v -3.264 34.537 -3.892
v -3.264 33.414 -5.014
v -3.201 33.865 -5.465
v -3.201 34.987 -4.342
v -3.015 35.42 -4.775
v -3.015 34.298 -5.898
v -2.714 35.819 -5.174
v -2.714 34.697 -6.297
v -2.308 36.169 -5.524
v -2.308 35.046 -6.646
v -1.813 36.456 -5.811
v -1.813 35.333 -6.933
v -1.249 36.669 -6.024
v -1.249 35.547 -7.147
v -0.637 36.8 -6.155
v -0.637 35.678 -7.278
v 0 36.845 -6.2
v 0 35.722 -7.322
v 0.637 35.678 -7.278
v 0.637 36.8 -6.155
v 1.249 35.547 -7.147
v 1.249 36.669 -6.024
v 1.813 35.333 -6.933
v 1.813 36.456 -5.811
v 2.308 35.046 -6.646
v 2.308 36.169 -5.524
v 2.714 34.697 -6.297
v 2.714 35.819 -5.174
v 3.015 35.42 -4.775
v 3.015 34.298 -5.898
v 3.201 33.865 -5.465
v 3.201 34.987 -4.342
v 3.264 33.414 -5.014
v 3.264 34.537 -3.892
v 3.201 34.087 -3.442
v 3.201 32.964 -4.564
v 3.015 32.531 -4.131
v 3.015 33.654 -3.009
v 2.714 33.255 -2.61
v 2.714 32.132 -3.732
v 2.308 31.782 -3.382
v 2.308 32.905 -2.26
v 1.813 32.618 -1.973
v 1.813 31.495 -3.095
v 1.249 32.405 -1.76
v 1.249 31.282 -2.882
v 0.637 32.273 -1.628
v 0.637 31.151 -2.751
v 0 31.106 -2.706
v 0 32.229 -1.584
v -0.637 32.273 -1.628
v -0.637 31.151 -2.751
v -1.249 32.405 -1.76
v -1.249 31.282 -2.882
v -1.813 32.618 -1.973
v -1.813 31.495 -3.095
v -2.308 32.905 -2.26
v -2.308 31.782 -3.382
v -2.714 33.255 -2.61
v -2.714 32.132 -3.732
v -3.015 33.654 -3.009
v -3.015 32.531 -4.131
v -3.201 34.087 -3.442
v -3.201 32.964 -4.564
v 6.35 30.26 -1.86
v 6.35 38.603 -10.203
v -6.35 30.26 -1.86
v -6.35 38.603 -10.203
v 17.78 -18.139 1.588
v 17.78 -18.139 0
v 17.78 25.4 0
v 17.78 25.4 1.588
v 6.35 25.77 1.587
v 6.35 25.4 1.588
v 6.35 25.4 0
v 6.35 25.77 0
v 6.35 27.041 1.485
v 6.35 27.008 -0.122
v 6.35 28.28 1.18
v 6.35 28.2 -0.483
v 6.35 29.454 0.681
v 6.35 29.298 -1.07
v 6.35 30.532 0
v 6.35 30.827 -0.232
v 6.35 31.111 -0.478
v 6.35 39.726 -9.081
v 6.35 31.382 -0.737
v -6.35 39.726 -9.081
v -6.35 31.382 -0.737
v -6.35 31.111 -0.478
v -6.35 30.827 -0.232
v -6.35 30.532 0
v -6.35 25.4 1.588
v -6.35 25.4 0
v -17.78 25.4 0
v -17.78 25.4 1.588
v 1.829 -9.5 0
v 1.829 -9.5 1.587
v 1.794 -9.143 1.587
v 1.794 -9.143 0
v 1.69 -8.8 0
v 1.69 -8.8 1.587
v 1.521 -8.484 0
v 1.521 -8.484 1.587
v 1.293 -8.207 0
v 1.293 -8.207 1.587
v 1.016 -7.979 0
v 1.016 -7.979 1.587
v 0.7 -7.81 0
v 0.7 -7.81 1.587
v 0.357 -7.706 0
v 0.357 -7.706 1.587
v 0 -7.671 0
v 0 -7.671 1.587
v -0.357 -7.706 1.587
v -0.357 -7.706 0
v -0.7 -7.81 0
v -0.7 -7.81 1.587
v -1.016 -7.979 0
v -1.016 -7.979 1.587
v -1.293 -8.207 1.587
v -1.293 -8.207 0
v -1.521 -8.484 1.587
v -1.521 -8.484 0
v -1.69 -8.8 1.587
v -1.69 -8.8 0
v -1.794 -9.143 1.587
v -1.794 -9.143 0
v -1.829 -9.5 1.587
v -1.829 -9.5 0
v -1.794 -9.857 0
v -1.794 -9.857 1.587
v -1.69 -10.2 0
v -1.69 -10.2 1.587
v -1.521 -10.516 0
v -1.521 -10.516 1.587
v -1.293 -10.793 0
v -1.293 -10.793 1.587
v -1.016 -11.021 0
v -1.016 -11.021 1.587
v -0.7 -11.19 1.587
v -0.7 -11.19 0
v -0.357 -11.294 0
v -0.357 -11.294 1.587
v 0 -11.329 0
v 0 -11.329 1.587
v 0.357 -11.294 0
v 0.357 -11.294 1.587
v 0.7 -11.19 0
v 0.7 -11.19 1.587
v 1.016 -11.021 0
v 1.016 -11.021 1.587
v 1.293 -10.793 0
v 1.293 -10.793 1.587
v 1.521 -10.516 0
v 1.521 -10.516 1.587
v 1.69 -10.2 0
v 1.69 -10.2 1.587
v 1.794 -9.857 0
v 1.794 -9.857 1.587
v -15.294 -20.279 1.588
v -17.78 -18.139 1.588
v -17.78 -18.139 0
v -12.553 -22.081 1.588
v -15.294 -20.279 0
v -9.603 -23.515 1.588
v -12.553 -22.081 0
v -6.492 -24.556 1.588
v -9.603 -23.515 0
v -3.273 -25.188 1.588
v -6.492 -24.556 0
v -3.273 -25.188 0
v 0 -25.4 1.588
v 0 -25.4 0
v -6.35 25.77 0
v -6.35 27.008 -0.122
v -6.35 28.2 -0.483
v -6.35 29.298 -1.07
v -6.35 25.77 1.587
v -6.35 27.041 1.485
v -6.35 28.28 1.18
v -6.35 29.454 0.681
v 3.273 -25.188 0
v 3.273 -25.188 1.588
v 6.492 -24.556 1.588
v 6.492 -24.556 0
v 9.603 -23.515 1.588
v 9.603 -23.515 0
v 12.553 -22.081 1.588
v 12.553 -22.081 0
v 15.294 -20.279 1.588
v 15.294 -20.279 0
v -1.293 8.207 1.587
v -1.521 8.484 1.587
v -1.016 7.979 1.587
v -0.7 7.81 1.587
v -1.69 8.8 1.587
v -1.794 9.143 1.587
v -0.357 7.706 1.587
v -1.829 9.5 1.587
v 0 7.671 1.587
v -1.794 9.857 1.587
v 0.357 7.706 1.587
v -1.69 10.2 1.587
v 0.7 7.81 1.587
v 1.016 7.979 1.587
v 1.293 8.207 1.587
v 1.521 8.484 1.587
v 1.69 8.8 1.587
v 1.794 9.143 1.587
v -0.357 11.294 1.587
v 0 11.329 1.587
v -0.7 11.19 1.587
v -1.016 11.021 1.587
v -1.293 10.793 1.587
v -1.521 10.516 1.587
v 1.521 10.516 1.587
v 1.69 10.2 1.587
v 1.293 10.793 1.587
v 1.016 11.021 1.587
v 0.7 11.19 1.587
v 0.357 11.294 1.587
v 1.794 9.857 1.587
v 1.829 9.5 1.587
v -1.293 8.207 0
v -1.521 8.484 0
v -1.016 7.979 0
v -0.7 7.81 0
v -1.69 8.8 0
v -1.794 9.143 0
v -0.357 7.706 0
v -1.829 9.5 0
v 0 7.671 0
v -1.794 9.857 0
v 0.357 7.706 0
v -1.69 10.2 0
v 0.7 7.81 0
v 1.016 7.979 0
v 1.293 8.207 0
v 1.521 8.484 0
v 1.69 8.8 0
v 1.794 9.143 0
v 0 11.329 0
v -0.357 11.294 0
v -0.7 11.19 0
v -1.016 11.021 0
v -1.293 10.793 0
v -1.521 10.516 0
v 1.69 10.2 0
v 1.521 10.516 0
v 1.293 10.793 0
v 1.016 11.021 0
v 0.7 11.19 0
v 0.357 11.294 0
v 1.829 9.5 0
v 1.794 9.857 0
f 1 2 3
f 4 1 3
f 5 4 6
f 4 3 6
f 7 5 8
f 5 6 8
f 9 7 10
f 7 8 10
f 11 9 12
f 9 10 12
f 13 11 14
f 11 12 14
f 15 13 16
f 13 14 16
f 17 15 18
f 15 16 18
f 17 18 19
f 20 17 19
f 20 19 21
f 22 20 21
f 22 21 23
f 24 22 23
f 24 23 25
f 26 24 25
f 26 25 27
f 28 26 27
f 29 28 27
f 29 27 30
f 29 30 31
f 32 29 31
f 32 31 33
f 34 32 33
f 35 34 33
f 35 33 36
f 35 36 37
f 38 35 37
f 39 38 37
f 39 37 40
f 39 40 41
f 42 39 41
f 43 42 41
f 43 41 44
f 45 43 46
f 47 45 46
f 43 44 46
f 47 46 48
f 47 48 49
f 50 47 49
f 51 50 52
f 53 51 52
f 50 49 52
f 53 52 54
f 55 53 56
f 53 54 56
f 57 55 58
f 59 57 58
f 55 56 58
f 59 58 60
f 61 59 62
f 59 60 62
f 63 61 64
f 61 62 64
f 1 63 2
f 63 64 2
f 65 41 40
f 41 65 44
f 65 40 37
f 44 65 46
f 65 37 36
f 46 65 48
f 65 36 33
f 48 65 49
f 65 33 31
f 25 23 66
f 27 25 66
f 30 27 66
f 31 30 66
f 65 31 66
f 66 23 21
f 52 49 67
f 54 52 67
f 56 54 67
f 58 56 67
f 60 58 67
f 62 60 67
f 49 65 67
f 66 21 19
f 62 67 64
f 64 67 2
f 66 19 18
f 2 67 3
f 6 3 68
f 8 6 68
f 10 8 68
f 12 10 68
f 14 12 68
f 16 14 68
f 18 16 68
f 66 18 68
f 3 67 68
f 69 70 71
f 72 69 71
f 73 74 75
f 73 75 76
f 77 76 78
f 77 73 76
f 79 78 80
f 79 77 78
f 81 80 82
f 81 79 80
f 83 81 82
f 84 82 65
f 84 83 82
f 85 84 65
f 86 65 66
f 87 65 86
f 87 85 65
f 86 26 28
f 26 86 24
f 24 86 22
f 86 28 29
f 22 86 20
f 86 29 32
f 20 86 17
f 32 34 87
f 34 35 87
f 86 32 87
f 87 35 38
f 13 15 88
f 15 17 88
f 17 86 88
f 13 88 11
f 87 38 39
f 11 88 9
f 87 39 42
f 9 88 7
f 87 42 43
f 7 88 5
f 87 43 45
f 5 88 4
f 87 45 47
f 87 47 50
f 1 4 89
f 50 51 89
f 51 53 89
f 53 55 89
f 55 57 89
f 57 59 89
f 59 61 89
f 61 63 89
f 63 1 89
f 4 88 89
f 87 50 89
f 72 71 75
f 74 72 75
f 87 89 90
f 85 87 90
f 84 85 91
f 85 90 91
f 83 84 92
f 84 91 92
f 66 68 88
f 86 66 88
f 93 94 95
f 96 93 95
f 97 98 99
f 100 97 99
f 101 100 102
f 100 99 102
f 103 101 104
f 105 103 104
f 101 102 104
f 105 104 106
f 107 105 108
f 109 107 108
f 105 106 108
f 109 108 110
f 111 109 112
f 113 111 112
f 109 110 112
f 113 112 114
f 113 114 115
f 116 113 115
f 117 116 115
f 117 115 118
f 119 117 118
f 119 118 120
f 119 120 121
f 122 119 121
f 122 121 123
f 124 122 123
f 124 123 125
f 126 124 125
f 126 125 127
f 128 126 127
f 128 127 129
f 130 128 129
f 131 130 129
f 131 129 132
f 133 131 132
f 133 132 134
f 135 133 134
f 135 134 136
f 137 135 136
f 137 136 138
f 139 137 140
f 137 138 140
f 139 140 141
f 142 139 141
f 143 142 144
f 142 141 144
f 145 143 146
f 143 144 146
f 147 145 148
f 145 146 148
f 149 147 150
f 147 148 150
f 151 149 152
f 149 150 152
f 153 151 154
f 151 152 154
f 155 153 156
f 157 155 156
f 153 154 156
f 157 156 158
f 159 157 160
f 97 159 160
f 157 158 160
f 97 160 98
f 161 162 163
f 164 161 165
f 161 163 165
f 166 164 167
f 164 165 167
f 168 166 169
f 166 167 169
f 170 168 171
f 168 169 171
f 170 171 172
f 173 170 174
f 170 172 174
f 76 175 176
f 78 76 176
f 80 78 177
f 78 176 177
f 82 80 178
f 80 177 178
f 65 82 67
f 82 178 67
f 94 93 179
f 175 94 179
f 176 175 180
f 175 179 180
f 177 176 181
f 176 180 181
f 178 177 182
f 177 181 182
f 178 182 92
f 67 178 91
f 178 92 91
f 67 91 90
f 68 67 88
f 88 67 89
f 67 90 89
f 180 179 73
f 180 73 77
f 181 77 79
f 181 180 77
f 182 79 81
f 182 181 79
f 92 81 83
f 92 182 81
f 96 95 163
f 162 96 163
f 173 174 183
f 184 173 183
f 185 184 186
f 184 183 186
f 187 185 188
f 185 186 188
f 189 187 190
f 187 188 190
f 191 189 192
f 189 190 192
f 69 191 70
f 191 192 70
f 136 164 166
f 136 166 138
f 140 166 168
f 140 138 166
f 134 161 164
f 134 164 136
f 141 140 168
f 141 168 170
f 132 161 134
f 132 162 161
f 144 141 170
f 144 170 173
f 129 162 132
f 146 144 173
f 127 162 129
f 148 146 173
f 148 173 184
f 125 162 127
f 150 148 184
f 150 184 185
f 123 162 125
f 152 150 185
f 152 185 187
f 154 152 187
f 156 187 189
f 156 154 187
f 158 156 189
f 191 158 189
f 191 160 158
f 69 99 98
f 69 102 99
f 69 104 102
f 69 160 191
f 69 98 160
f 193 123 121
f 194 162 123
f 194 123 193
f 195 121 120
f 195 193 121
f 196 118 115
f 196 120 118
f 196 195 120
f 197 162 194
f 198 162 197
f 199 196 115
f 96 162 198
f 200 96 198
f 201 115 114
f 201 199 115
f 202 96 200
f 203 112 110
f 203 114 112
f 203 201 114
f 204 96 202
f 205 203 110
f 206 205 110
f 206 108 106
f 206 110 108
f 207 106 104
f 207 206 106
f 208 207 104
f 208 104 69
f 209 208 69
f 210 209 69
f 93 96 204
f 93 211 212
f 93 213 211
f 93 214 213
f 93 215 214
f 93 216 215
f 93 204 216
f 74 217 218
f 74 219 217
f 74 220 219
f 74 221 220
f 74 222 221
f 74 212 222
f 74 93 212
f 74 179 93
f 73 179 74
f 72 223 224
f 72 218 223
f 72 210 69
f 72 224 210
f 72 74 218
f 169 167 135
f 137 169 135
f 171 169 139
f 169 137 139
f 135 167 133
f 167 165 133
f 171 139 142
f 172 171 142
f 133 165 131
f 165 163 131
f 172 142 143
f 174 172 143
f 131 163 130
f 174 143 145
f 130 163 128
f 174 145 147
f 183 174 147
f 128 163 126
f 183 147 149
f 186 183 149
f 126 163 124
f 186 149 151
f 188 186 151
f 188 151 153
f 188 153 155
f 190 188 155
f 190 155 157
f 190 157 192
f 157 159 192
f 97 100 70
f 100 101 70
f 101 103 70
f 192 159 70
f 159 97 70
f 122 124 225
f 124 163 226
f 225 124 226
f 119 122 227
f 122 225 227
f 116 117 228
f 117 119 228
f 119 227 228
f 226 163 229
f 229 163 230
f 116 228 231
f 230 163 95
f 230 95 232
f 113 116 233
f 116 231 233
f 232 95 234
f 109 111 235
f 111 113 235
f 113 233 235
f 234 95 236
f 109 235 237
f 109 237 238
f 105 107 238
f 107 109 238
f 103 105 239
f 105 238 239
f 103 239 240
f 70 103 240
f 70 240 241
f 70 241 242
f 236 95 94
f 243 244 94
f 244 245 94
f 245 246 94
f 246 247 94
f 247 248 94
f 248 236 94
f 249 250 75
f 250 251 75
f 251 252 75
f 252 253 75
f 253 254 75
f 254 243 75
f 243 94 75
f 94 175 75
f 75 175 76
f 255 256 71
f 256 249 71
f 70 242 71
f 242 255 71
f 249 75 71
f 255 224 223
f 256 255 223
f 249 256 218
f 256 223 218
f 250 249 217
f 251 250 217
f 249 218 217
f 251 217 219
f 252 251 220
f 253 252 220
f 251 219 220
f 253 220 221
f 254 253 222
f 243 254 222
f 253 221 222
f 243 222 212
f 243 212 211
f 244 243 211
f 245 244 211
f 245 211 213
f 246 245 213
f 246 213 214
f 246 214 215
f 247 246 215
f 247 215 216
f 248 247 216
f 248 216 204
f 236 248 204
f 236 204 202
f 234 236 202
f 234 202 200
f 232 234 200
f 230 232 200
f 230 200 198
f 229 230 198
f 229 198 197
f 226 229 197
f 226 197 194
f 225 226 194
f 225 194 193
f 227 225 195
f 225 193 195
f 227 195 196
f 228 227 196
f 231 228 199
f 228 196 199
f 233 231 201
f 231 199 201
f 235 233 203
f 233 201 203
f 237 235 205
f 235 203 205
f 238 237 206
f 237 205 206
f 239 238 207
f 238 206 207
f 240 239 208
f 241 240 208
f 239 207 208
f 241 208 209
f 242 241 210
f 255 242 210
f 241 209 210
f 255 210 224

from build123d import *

# Parameters (mm, degrees)
BOSS_EXTRUDE1_DEPTH         = 1.5875
F_6_CLEARANCE_HOLE2_D       = 3.6576
F_6_CLEARANCE_HOLE2_DEPTH   = 38.354
F_6_CLEARANCE_HOLE2_TIP     = 1.0988539
SKETCHED_START              = -6.35
SKETCHED_BEND10_DEPTH       = 12.7
SKETCHED_BEND10_2_DEPTH     = 12.7
CUT_EXTRUDE1_DEPTH          = 45.703347893
F_1_4_CLEARANCE_HOLE1_D     = 6.5278
F_1_4_CLEARANCE_HOLE1_DEPTH = 38.354
F_1_4_CLEARANCE_HOLE1_TIP   = 1.961148974


# Read off the part's stored shape, not the designer's step: Sketched Bend10
with BuildPart() as part:
    # Sketch1 → Boss-Extrude1 (new body)
    with BuildSketch(Plane.XY):
        Polygon((-17.78, -25.4), (17.78, -25.4), (17.78, 25.4), (6.35, 25.4), (6.35, 43.18), (-6.35, 43.18), (-6.35, 25.4), (-17.78, 25.4), align=None)
    extrude(amount=BOSS_EXTRUDE1_DEPTH)

    # #6 Clearance Hole2
    with Locations(Plane(origin=(0, 0, 0), x_dir=(-1, 0, 0), z_dir=(0, 0, -1))):
        with Locations((0, 9.5), (0, -9.5)):
            Hole(F_6_CLEARANCE_HOLE2_D / 2, depth=F_6_CLEARANCE_HOLE2_DEPTH)
            with Locations((0, 0, -(F_6_CLEARANCE_HOLE2_DEPTH + F_6_CLEARANCE_HOLE2_TIP / 2))):  # 118° drill point
                Cone(0, F_6_CLEARANCE_HOLE2_D / 2, F_6_CLEARANCE_HOLE2_TIP, mode=Mode.SUBTRACT)

    # Sketched Bend10 outline → Sketched Bend10 (cut)
    with BuildSketch(Plane.YZ.offset(SKETCHED_START)):
        with BuildLine():
            ThreePointArc((25.769655935, 1.5875), (28.279713828, 1.180173678), (30.532155935, 0))
            Line((30.532155935, 0), (43.18, 0))
            Line((43.18, 0), (43.18, 1.5875))
            Line((43.18, 1.5875), (25.769655935, 1.5875))
        make_face()
    extrude(amount=SKETCHED_BEND10_DEPTH, mode=Mode.SUBTRACT)

    # Sketched Bend10 2 outline → Sketched Bend10 2 (add)
    with BuildSketch(Plane.YZ.offset(SKETCHED_START)):
        with BuildLine():
            Line((39.725932738, -9.080956652), (31.382316011, -0.737339924))
            ThreePointArc((31.382316011, -0.737339924), (30.970319757, -0.353584232), (30.532155935, 0))
            Line((30.532155935, 0), (25.769655935, 0))
            ThreePointArc((25.769655935, 0), (28.19969573, -0.483364969), (30.259783996, -1.859871939))
            Line((30.259783996, -1.859871939), (38.603400723, -10.203488667))
            Line((38.603400723, -10.203488667), (39.725932738, -9.080956652))
        make_face()
    extrude(amount=SKETCHED_BEND10_2_DEPTH)

    # Sketch18 → Cut-Extrude1 (cut, through all)
    with BuildSketch(Plane(origin=(0, 0, 0), x_dir=(-1, 0, 0), z_dir=(0, 0, -1))):
        with BuildLine():
            Line((-17.78, -25.4), (0, -25.4))
            ThreePointArc((0, -25.4), (-9.602697629, -23.51485059), (-17.78, -18.139228208))
            Line((-17.78, -18.139228208), (-17.78, -25.4))
        make_face()
        with BuildLine():
            Line((17.78, -25.4), (17.78, -18.139228208))
            ThreePointArc((17.78, -18.139228208), (9.602697629, -23.51485059), (0, -25.4))
            Line((0, -25.4), (17.78, -25.4))
        make_face()
    extrude(amount=-CUT_EXTRUDE1_DEPTH, mode=Mode.SUBTRACT)

    # 1/4 Clearance Hole1
    with Locations(Plane(origin=(0, 15.322488043, 15.322488043), x_dir=(1, 0, 0), z_dir=(0, 0.7071067811865487, 0.7071067811865465))):
        with Locations((0, 27.173236583)):
            Hole(F_1_4_CLEARANCE_HOLE1_D / 2, depth=F_1_4_CLEARANCE_HOLE1_DEPTH)
            with Locations((0, 0, -(F_1_4_CLEARANCE_HOLE1_DEPTH + F_1_4_CLEARANCE_HOLE1_TIP / 2))):  # 118° drill point
                Cone(0, F_1_4_CLEARANCE_HOLE1_D / 2, F_1_4_CLEARANCE_HOLE1_TIP, mode=Mode.SUBTRACT)


solid = part.part
